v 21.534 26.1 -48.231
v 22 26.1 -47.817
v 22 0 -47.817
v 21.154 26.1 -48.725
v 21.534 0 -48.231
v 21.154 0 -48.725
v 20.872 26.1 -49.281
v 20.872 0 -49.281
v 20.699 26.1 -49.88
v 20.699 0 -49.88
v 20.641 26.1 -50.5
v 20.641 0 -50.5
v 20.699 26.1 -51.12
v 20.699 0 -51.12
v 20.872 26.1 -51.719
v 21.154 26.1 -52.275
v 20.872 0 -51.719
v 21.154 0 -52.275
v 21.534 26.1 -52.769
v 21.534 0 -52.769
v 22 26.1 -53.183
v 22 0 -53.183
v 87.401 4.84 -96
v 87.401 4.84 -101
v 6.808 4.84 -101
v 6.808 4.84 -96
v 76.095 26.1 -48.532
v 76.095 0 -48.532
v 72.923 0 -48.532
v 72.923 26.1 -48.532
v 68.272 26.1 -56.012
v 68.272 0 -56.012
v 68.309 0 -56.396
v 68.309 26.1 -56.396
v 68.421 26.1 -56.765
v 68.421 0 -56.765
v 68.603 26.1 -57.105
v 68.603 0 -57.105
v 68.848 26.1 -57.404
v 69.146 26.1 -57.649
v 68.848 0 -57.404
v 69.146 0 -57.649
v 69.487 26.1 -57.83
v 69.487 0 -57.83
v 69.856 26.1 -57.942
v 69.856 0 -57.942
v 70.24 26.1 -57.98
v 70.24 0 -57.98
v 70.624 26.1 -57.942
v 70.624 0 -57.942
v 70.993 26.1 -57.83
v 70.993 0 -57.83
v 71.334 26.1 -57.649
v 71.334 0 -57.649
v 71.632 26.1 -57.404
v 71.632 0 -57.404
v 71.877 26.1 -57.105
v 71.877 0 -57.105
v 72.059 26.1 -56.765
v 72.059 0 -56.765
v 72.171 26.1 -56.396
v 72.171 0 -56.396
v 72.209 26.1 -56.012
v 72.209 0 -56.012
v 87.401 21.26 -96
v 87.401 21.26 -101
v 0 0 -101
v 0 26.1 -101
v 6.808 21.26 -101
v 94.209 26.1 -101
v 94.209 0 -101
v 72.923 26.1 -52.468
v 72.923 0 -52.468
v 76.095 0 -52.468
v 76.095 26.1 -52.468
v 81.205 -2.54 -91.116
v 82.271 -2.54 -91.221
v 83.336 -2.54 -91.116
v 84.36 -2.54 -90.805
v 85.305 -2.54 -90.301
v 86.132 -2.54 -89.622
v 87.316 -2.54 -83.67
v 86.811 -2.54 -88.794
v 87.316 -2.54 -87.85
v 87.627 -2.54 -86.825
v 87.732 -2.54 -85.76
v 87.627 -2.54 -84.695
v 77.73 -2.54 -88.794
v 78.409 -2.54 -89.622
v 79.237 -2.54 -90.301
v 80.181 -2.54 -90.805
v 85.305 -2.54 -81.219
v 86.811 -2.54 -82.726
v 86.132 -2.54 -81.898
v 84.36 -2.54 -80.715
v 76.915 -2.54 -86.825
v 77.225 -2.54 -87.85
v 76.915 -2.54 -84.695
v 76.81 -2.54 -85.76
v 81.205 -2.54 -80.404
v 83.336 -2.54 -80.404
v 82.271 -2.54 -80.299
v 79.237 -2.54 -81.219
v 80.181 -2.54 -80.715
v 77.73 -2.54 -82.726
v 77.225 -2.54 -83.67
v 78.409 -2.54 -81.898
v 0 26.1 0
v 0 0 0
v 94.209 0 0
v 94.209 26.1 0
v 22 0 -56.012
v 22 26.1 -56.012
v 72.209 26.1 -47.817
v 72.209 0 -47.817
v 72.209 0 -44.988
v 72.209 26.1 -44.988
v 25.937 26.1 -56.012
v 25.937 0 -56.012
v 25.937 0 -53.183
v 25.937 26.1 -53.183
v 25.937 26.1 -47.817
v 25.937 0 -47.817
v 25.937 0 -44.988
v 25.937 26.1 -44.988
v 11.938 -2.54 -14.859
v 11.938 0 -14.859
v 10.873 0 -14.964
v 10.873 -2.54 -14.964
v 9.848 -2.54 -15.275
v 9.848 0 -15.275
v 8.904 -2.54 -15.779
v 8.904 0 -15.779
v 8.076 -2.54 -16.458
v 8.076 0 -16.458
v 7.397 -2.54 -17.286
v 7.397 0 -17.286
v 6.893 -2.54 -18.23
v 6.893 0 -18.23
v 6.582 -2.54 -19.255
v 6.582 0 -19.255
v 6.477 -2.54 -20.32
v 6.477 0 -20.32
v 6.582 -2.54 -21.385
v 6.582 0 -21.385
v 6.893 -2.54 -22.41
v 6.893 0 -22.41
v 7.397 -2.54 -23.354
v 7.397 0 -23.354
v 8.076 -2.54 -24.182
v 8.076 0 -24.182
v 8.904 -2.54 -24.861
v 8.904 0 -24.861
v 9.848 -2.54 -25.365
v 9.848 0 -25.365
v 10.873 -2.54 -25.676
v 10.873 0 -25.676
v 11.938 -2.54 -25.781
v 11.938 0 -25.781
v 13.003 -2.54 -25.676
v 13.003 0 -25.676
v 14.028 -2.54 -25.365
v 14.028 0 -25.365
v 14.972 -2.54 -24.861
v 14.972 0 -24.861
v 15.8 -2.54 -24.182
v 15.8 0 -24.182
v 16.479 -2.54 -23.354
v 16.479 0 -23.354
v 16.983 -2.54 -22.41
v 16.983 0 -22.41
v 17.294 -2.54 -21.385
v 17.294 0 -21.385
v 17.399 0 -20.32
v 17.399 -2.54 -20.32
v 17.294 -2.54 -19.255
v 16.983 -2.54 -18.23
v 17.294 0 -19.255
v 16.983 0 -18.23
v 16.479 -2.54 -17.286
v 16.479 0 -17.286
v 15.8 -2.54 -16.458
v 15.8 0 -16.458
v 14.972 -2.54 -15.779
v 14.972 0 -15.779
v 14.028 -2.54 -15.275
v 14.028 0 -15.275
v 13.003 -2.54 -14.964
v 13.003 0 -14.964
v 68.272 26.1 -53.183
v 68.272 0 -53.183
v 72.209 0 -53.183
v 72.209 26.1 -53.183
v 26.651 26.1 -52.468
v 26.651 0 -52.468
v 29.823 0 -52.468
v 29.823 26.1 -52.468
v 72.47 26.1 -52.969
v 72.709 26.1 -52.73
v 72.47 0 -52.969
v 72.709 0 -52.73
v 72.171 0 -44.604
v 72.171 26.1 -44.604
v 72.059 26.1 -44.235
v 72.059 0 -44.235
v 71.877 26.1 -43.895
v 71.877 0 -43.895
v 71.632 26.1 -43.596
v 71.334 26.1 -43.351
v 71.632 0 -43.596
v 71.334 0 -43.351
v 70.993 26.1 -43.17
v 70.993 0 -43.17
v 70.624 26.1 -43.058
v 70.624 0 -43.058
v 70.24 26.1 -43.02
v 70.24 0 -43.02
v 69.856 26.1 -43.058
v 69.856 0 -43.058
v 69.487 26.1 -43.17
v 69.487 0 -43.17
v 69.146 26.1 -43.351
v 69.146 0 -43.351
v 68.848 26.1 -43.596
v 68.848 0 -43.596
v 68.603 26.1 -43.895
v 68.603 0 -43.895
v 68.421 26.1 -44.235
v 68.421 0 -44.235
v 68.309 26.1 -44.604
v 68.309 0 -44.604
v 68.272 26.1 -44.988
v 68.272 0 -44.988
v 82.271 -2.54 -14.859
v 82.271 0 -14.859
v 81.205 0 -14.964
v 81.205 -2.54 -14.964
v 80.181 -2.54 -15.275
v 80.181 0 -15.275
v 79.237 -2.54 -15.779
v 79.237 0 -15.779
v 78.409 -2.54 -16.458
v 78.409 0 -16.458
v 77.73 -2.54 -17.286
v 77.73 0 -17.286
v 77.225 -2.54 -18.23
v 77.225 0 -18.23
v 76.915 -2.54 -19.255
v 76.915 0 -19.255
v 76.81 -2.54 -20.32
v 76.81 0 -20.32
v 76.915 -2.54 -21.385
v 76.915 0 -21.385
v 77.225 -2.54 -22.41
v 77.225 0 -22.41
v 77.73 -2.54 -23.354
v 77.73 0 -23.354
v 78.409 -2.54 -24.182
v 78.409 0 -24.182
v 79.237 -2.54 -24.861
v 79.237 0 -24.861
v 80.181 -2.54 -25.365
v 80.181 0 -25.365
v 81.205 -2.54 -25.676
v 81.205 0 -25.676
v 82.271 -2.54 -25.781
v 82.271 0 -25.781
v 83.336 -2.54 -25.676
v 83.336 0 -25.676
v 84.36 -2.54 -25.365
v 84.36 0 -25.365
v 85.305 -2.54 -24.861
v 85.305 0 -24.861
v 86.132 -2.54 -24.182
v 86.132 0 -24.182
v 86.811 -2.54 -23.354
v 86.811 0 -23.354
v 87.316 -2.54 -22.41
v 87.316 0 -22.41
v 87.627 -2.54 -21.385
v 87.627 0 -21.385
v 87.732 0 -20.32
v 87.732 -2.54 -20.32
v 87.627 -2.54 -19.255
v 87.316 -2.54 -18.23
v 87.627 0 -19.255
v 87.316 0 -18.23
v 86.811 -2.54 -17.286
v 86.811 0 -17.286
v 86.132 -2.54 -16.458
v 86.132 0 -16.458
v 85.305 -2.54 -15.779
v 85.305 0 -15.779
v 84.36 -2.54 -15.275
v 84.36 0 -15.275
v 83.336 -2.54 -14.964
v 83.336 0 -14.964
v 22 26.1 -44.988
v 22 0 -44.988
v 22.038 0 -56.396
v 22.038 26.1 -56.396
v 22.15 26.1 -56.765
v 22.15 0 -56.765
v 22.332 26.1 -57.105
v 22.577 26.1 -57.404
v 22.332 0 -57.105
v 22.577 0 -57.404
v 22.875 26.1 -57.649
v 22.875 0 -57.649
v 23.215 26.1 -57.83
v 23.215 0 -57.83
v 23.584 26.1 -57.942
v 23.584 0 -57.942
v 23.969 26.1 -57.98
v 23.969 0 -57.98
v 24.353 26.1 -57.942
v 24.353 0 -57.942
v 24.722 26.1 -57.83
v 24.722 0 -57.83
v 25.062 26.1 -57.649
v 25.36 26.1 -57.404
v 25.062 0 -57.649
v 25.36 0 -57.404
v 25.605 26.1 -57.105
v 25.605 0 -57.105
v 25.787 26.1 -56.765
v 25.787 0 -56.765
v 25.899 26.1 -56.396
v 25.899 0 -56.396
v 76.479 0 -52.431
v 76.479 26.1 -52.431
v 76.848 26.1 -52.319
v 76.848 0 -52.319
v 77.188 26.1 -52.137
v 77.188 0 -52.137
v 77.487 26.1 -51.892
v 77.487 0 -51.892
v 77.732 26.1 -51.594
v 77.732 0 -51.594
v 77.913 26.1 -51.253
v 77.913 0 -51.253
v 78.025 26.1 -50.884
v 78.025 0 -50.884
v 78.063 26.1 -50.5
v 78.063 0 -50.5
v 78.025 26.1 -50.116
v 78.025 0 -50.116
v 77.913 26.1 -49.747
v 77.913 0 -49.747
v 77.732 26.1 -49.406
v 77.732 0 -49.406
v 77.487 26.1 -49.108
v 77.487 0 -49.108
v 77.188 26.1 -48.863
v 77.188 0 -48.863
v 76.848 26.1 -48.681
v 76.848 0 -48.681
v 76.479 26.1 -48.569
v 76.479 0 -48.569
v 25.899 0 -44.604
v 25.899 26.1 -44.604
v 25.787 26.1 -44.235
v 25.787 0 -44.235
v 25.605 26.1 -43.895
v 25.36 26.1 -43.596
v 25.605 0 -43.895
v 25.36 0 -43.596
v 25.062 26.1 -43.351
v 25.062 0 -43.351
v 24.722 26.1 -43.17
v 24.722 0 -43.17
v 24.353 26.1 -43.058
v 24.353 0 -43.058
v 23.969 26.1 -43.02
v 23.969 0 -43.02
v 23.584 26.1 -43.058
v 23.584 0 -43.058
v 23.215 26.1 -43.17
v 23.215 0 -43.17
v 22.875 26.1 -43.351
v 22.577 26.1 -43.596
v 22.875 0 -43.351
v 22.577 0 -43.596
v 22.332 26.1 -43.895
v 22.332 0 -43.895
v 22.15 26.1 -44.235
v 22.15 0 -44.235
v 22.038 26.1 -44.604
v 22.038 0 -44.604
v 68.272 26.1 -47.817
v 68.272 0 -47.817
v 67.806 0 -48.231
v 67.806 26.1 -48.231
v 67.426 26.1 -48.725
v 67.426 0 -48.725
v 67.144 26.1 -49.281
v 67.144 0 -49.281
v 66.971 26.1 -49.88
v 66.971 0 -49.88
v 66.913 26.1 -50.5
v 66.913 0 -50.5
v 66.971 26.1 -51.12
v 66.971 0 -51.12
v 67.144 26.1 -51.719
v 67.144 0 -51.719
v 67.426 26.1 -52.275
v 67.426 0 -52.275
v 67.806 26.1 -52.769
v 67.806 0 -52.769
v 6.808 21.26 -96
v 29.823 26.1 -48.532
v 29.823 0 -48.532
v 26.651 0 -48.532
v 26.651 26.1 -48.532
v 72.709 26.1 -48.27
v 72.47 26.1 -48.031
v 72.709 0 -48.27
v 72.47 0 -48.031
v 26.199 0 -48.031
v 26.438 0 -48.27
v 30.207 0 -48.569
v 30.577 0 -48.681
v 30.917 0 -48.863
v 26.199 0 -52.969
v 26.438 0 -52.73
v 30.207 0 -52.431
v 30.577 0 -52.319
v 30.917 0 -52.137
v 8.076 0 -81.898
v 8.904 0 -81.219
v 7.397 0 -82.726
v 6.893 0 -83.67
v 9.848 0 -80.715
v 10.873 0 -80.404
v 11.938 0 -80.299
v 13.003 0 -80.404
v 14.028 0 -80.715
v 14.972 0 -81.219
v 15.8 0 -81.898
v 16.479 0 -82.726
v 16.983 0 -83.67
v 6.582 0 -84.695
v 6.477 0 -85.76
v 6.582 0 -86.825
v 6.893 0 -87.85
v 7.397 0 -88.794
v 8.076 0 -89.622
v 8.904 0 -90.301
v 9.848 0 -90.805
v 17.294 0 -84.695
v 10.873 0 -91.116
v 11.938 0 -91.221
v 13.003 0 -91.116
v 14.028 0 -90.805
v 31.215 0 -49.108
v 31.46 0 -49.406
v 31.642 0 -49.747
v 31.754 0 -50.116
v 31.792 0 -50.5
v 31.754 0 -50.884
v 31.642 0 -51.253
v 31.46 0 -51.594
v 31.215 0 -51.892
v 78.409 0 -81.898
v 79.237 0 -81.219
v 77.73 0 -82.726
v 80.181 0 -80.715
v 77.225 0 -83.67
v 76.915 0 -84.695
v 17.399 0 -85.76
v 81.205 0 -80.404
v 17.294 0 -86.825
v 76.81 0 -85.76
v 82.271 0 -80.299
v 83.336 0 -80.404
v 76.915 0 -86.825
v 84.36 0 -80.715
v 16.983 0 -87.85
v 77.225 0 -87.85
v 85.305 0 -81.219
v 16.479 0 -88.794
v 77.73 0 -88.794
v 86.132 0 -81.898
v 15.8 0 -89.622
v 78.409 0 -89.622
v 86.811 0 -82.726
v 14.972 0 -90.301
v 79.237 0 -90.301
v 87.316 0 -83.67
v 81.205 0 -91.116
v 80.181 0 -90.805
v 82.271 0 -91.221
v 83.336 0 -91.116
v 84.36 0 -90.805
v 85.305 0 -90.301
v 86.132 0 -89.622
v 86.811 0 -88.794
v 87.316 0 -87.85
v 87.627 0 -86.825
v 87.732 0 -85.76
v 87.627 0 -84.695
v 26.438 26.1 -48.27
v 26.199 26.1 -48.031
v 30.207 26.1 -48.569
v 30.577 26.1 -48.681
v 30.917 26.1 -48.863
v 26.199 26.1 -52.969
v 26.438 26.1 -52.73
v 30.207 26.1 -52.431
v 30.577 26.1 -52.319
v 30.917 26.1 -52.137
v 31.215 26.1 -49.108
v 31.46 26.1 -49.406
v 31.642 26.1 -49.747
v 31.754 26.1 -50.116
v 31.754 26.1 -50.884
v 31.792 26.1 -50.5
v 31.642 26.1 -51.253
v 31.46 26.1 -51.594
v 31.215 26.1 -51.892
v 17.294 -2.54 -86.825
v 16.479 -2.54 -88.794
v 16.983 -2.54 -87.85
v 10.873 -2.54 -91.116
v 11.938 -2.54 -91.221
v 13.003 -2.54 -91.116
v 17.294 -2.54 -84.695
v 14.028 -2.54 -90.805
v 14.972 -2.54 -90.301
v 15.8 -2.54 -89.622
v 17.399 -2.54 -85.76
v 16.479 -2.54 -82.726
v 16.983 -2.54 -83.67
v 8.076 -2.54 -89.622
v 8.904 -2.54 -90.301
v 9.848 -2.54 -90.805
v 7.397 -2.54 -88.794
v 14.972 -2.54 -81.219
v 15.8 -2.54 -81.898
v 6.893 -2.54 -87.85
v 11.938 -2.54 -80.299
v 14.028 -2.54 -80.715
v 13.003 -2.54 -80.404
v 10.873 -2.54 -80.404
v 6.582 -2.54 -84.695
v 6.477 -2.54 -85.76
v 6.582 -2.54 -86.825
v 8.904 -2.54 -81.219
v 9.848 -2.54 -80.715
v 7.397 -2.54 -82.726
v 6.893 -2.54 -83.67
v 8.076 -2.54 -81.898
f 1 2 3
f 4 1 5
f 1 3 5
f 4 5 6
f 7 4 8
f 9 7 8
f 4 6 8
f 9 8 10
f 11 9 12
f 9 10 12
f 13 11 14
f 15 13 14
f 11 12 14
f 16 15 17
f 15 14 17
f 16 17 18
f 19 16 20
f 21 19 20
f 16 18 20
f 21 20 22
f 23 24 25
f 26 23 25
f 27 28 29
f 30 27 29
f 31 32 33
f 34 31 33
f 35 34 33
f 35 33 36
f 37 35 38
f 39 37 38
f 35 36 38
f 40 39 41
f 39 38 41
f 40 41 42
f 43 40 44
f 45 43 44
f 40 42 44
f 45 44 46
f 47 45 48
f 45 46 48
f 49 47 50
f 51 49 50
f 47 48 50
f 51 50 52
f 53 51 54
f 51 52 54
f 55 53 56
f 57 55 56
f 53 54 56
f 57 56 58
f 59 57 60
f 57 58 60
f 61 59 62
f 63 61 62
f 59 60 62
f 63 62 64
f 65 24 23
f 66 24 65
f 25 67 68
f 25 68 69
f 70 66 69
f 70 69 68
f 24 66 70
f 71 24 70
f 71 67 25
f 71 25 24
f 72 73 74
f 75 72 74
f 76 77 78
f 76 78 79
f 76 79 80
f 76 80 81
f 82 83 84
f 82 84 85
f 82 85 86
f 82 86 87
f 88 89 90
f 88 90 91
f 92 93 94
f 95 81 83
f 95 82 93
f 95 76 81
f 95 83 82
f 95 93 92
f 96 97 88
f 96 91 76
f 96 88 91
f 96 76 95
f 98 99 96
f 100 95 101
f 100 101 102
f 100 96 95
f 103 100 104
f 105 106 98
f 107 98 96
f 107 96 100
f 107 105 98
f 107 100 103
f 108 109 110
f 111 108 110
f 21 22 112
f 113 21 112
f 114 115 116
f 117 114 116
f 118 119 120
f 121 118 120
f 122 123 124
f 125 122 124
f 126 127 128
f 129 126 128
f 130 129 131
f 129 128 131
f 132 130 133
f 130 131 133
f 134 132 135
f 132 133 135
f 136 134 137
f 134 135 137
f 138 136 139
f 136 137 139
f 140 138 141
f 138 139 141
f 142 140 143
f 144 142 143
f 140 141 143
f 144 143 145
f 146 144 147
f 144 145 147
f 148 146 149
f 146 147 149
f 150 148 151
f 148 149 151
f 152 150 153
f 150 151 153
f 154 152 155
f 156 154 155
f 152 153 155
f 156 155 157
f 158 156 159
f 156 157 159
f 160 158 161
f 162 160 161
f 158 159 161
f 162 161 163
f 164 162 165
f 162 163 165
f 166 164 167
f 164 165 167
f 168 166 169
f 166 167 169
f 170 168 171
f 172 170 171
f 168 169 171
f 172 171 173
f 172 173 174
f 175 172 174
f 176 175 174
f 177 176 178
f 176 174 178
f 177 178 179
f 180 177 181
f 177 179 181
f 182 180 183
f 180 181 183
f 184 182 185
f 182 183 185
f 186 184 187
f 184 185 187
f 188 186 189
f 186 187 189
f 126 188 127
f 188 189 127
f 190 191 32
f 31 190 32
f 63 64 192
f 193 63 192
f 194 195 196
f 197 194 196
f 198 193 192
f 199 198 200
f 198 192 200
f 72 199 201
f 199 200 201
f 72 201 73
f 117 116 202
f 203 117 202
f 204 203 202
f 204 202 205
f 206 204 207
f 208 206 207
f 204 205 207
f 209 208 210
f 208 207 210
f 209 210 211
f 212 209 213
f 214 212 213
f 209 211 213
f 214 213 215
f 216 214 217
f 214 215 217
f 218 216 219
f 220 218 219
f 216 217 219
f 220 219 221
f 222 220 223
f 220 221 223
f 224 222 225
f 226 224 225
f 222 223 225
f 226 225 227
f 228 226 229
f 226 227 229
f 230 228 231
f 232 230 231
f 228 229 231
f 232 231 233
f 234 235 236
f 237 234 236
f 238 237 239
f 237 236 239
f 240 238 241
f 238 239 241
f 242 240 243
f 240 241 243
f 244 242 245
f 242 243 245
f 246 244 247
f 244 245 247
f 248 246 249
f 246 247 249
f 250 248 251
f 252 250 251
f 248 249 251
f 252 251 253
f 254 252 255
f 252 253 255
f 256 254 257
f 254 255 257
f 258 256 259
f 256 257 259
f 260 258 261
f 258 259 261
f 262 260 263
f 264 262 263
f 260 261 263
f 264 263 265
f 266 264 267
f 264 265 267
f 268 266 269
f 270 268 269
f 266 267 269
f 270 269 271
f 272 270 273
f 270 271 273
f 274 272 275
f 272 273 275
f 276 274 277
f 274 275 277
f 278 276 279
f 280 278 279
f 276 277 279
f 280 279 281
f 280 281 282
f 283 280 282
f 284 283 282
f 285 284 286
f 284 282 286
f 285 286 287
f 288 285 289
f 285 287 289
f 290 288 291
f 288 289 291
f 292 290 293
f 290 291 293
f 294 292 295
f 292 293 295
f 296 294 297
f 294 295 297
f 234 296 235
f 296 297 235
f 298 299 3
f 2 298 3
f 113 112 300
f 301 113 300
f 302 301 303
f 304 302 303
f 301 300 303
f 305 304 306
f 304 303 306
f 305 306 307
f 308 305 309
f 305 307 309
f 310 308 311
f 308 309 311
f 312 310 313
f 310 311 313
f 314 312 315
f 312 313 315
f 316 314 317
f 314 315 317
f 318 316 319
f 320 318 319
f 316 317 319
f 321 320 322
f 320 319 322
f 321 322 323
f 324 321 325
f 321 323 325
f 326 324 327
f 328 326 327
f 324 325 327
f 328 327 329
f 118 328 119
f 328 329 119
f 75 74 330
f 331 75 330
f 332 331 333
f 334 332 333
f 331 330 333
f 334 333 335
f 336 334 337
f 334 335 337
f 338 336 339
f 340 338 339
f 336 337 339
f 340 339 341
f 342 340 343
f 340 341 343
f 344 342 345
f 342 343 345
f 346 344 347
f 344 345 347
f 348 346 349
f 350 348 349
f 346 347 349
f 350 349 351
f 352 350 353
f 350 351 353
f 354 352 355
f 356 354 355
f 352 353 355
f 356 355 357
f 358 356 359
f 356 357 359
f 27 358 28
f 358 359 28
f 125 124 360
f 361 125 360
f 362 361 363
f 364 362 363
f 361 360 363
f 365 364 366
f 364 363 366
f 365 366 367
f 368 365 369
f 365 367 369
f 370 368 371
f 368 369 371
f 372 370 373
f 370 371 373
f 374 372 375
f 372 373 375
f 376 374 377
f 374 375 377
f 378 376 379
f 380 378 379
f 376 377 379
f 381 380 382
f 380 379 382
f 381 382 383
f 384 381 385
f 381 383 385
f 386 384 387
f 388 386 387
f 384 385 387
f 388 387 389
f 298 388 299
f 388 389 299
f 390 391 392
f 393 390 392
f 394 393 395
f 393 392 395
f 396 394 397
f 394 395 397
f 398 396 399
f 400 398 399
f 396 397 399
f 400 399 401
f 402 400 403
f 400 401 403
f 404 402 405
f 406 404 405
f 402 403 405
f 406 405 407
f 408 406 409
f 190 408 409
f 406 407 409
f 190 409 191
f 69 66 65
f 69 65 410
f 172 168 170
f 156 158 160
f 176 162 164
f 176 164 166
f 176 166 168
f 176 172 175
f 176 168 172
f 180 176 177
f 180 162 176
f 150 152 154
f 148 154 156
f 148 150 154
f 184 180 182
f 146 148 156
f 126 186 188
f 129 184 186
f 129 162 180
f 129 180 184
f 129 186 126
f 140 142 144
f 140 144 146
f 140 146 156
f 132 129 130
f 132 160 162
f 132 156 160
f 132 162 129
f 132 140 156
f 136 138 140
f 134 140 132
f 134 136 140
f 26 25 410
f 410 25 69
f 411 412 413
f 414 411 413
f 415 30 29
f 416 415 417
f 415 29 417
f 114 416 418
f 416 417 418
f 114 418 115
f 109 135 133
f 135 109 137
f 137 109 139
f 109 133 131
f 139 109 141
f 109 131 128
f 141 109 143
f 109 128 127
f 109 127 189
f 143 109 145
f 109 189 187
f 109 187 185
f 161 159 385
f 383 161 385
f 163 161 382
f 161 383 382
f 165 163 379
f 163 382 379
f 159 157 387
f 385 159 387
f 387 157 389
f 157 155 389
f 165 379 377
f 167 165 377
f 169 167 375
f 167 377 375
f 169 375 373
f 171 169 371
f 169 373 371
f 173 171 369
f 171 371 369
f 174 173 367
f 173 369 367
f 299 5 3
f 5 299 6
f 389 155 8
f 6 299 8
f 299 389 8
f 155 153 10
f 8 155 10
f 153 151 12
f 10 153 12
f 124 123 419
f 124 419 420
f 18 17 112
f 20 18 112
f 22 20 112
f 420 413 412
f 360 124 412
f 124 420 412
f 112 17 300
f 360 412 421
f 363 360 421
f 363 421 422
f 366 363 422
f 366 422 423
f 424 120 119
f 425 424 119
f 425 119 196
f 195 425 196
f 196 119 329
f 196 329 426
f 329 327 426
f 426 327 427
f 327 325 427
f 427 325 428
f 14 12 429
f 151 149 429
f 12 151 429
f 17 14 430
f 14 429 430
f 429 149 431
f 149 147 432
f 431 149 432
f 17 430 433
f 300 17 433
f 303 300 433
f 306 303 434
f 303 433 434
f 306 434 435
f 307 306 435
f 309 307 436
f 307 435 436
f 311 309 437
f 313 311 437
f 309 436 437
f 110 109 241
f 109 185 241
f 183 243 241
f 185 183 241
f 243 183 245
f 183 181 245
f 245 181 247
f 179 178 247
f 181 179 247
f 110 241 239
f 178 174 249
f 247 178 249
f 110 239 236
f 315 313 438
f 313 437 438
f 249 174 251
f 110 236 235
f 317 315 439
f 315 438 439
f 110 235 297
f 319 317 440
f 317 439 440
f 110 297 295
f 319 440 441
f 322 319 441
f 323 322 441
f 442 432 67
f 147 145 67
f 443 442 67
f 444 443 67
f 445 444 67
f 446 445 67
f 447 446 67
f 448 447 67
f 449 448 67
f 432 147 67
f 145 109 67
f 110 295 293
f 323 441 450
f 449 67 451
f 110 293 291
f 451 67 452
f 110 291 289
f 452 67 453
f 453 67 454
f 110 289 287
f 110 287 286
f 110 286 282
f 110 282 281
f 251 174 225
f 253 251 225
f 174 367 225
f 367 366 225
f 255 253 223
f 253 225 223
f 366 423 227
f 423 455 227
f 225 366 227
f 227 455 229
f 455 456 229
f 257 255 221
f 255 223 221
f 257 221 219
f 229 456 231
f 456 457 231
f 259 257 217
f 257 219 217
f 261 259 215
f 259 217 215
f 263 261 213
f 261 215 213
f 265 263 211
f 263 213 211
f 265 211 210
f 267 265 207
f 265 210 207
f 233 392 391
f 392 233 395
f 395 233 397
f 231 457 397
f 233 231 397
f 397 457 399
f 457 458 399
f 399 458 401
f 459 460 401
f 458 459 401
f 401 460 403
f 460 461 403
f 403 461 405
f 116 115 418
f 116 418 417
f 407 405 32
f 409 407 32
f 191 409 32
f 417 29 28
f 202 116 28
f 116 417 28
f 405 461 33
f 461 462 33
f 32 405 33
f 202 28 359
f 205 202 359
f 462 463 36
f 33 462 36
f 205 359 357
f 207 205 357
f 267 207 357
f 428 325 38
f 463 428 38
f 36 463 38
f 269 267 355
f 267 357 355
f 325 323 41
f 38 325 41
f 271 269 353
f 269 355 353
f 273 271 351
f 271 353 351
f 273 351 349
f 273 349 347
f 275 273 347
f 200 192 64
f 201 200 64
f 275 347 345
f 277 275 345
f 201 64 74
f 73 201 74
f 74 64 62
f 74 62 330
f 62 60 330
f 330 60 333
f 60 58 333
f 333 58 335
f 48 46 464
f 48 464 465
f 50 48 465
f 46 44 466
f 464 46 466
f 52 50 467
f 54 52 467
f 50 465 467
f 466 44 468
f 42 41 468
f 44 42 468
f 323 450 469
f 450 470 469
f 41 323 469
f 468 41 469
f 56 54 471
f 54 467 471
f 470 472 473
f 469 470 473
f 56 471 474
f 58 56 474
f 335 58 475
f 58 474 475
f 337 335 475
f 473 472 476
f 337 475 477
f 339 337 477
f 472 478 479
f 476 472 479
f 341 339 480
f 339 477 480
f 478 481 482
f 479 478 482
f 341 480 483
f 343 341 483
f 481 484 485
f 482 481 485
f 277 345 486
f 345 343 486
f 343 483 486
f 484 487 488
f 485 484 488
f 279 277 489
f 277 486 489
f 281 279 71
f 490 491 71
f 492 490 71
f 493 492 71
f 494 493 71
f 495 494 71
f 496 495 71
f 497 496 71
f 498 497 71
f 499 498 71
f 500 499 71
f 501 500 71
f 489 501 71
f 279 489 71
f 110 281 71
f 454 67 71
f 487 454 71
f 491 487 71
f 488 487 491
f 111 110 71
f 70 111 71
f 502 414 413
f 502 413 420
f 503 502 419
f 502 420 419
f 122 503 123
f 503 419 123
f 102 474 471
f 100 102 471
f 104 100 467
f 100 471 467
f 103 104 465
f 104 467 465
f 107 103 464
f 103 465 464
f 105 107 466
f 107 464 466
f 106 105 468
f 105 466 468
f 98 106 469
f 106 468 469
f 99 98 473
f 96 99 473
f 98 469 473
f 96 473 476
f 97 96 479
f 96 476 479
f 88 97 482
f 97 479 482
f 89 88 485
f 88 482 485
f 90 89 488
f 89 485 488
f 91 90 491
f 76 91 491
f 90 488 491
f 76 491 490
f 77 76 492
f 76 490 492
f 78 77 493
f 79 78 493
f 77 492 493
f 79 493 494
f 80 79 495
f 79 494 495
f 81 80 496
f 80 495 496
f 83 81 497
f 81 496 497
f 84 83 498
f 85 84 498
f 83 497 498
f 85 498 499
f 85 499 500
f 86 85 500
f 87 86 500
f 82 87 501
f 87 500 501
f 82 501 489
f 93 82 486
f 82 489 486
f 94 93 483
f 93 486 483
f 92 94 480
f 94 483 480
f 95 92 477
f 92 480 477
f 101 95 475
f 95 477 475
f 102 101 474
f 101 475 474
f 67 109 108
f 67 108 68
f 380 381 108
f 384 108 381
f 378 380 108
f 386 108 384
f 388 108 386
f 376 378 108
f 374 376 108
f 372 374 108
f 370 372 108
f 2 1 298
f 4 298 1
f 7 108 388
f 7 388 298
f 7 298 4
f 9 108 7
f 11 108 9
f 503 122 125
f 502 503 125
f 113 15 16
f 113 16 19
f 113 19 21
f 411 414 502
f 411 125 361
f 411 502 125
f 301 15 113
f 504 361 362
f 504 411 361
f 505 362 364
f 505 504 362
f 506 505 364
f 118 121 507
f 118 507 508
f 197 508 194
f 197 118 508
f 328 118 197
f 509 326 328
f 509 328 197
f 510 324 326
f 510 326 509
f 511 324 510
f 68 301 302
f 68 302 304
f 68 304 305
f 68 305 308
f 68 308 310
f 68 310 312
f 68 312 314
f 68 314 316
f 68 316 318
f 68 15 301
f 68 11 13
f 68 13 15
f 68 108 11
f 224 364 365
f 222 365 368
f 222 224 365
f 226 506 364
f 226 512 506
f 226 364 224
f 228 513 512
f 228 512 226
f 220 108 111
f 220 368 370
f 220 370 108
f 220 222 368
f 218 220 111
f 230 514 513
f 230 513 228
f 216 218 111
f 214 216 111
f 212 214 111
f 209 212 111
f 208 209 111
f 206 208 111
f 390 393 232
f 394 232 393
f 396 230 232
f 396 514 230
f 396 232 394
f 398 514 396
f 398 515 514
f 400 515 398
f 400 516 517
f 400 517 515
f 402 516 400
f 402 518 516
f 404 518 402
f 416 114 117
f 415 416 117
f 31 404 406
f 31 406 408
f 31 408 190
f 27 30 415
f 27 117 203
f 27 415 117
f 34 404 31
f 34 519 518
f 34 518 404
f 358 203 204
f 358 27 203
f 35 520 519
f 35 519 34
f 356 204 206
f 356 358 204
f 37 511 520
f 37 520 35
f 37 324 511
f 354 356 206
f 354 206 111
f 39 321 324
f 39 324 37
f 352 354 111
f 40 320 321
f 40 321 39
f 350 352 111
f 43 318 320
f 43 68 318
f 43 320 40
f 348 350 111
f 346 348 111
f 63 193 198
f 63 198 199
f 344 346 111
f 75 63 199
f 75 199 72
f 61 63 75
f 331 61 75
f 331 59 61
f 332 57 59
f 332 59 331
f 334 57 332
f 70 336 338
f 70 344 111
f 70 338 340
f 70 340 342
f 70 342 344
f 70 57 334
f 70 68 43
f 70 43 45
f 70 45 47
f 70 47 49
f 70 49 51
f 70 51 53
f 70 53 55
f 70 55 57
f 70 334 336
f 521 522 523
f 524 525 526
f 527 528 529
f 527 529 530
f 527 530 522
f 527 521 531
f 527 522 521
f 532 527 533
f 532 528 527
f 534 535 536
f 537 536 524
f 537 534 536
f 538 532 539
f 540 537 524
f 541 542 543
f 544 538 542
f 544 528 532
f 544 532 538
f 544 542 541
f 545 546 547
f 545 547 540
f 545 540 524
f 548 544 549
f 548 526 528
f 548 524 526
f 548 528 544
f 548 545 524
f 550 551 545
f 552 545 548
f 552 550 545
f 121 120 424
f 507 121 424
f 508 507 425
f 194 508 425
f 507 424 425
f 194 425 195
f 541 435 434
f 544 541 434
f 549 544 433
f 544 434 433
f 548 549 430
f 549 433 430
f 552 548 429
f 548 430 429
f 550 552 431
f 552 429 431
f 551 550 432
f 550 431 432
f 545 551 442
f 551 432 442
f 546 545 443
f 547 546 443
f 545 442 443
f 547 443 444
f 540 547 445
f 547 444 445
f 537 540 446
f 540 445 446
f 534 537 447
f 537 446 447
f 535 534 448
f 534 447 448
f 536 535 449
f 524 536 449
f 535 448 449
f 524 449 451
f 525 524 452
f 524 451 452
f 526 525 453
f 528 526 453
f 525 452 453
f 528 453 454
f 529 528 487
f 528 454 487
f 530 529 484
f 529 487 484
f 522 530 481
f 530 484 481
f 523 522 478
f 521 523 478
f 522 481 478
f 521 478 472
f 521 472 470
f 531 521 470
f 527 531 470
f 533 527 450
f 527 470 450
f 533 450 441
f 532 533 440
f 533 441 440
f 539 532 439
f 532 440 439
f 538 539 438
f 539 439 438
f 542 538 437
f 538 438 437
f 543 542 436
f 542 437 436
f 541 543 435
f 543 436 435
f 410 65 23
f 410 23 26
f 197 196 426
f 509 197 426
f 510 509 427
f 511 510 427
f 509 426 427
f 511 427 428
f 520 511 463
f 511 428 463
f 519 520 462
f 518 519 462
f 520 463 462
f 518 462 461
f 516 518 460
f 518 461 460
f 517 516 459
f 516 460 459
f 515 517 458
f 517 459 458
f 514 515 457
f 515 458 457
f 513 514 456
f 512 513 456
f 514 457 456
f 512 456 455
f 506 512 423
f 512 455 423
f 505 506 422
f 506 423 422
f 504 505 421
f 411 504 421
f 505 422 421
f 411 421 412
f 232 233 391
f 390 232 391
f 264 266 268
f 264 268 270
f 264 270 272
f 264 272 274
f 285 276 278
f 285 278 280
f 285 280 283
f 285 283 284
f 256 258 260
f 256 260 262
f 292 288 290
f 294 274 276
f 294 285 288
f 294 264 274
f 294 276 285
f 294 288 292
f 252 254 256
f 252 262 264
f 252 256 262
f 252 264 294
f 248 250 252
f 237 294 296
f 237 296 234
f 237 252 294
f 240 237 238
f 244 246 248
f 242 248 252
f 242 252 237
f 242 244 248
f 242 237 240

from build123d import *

# Parameters (mm, degrees)
SKETCH1_W           = 94.2086
SKETCH1_H           = 101
BOSS_EXTRUDE1_DEPTH = 26.1
SKETCH2_R           = 5.461
BOSS_EXTRUDE2_DEPTH = 2.54
SKETCH3_W           = 80.593596518
SKETCH3_H           = 16.42098599
CUT_EXTRUDE1_DEPTH  = 5


with BuildPart() as part:
    # Sketch1 → Boss-Extrude1 (new body)
    with BuildSketch(Plane(origin=(0, 0, 0), x_dir=(1, 0, 0), z_dir=(0, 1, 0))):
        with Locations((47.1043, 50.5)):
            Rectangle(SKETCH1_W, SKETCH1_H)
        with BuildLine():
            ThreePointArc((22, 56.0118), (23.9685, 57.9803), (25.937, 56.0118))
            Line((25.937, 56.0118), (25.937, 53.182647668))
            ThreePointArc((25.937, 53.182647668), (26.321327104, 52.852827104), (26.651147668, 52.4685))
            Line((26.651147668, 52.4685), (29.8232, 52.4685))
            ThreePointArc((29.8232, 52.4685), (31.7917, 50.5), (29.8232, 48.5315))
            Line((29.8232, 48.5315), (26.651147668, 48.5315))
            ThreePointArc((26.651147668, 48.5315), (26.321327104, 48.147172896), (25.937, 47.817352332))
            Line((25.937, 47.817352332), (25.937, 44.9882))
            ThreePointArc((25.937, 44.9882), (23.9685, 43.0197), (22, 44.9882))
            Line((22, 44.9882), (22, 47.817352332))
            ThreePointArc((22, 47.817352332), (20.6411, 50.5), (22, 53.182647668))
            Line((22, 53.182647668), (22, 56.0118))
        make_face(mode=Mode.SUBTRACT)
        with BuildLine():
            ThreePointArc((68.2716, 56.0118), (70.2401, 57.9803), (72.2086, 56.0118))
            Line((72.2086, 56.0118), (72.2086, 53.182647668))
            ThreePointArc((72.2086, 53.182647668), (72.592927104, 52.852827104), (72.922747668, 52.4685))
            Line((72.922747668, 52.4685), (76.0948, 52.4685))
            ThreePointArc((76.0948, 52.4685), (78.0633, 50.5), (76.0948, 48.5315))
            Line((76.0948, 48.5315), (72.922747668, 48.5315))
            ThreePointArc((72.922747668, 48.5315), (72.592927104, 48.147172896), (72.2086, 47.817352332))
            Line((72.2086, 47.817352332), (72.2086, 44.9882))
            ThreePointArc((72.2086, 44.9882), (70.2401, 43.0197), (68.2716, 44.9882))
            Line((68.2716, 44.9882), (68.2716, 47.817352332))
            ThreePointArc((68.2716, 47.817352332), (66.9127, 50.5), (68.2716, 53.182647668))
            Line((68.2716, 53.182647668), (68.2716, 56.0118))
        make_face(mode=Mode.SUBTRACT)
    extrude(amount=BOSS_EXTRUDE1_DEPTH)

    # Sketch2 → Boss-Extrude2 (add)
    with BuildSketch(Plane.XZ):
        with Locations(Location((11.938, -20.32, 0), (0, 0, 90))):
            Circle(SKETCH2_R)
        with Locations(Location((82.2706, -20.32, 0), (0, 0, 90))):
            Circle(SKETCH2_R)
        with Locations(Location((11.938, -85.76, 0), (0, 0, 90))):
            Circle(SKETCH2_R)
        with Locations(Location((82.2706, -85.76, 0), (0, 0, 90))):
            Circle(SKETCH2_R)
    extrude(amount=BOSS_EXTRUDE2_DEPTH)

    # Sketch3 → Cut-Extrude1 (cut)
    with BuildSketch(Plane(origin=(0, 0, -101), x_dir=(-1, 0, 0), z_dir=(0, 0, -1))):
        with Locations((-47.1043, 13.05)):
            Rectangle(SKETCH3_W, SKETCH3_H)
    extrude(amount=-CUT_EXTRUDE1_DEPTH, mode=Mode.SUBTRACT)


solid = part.part
